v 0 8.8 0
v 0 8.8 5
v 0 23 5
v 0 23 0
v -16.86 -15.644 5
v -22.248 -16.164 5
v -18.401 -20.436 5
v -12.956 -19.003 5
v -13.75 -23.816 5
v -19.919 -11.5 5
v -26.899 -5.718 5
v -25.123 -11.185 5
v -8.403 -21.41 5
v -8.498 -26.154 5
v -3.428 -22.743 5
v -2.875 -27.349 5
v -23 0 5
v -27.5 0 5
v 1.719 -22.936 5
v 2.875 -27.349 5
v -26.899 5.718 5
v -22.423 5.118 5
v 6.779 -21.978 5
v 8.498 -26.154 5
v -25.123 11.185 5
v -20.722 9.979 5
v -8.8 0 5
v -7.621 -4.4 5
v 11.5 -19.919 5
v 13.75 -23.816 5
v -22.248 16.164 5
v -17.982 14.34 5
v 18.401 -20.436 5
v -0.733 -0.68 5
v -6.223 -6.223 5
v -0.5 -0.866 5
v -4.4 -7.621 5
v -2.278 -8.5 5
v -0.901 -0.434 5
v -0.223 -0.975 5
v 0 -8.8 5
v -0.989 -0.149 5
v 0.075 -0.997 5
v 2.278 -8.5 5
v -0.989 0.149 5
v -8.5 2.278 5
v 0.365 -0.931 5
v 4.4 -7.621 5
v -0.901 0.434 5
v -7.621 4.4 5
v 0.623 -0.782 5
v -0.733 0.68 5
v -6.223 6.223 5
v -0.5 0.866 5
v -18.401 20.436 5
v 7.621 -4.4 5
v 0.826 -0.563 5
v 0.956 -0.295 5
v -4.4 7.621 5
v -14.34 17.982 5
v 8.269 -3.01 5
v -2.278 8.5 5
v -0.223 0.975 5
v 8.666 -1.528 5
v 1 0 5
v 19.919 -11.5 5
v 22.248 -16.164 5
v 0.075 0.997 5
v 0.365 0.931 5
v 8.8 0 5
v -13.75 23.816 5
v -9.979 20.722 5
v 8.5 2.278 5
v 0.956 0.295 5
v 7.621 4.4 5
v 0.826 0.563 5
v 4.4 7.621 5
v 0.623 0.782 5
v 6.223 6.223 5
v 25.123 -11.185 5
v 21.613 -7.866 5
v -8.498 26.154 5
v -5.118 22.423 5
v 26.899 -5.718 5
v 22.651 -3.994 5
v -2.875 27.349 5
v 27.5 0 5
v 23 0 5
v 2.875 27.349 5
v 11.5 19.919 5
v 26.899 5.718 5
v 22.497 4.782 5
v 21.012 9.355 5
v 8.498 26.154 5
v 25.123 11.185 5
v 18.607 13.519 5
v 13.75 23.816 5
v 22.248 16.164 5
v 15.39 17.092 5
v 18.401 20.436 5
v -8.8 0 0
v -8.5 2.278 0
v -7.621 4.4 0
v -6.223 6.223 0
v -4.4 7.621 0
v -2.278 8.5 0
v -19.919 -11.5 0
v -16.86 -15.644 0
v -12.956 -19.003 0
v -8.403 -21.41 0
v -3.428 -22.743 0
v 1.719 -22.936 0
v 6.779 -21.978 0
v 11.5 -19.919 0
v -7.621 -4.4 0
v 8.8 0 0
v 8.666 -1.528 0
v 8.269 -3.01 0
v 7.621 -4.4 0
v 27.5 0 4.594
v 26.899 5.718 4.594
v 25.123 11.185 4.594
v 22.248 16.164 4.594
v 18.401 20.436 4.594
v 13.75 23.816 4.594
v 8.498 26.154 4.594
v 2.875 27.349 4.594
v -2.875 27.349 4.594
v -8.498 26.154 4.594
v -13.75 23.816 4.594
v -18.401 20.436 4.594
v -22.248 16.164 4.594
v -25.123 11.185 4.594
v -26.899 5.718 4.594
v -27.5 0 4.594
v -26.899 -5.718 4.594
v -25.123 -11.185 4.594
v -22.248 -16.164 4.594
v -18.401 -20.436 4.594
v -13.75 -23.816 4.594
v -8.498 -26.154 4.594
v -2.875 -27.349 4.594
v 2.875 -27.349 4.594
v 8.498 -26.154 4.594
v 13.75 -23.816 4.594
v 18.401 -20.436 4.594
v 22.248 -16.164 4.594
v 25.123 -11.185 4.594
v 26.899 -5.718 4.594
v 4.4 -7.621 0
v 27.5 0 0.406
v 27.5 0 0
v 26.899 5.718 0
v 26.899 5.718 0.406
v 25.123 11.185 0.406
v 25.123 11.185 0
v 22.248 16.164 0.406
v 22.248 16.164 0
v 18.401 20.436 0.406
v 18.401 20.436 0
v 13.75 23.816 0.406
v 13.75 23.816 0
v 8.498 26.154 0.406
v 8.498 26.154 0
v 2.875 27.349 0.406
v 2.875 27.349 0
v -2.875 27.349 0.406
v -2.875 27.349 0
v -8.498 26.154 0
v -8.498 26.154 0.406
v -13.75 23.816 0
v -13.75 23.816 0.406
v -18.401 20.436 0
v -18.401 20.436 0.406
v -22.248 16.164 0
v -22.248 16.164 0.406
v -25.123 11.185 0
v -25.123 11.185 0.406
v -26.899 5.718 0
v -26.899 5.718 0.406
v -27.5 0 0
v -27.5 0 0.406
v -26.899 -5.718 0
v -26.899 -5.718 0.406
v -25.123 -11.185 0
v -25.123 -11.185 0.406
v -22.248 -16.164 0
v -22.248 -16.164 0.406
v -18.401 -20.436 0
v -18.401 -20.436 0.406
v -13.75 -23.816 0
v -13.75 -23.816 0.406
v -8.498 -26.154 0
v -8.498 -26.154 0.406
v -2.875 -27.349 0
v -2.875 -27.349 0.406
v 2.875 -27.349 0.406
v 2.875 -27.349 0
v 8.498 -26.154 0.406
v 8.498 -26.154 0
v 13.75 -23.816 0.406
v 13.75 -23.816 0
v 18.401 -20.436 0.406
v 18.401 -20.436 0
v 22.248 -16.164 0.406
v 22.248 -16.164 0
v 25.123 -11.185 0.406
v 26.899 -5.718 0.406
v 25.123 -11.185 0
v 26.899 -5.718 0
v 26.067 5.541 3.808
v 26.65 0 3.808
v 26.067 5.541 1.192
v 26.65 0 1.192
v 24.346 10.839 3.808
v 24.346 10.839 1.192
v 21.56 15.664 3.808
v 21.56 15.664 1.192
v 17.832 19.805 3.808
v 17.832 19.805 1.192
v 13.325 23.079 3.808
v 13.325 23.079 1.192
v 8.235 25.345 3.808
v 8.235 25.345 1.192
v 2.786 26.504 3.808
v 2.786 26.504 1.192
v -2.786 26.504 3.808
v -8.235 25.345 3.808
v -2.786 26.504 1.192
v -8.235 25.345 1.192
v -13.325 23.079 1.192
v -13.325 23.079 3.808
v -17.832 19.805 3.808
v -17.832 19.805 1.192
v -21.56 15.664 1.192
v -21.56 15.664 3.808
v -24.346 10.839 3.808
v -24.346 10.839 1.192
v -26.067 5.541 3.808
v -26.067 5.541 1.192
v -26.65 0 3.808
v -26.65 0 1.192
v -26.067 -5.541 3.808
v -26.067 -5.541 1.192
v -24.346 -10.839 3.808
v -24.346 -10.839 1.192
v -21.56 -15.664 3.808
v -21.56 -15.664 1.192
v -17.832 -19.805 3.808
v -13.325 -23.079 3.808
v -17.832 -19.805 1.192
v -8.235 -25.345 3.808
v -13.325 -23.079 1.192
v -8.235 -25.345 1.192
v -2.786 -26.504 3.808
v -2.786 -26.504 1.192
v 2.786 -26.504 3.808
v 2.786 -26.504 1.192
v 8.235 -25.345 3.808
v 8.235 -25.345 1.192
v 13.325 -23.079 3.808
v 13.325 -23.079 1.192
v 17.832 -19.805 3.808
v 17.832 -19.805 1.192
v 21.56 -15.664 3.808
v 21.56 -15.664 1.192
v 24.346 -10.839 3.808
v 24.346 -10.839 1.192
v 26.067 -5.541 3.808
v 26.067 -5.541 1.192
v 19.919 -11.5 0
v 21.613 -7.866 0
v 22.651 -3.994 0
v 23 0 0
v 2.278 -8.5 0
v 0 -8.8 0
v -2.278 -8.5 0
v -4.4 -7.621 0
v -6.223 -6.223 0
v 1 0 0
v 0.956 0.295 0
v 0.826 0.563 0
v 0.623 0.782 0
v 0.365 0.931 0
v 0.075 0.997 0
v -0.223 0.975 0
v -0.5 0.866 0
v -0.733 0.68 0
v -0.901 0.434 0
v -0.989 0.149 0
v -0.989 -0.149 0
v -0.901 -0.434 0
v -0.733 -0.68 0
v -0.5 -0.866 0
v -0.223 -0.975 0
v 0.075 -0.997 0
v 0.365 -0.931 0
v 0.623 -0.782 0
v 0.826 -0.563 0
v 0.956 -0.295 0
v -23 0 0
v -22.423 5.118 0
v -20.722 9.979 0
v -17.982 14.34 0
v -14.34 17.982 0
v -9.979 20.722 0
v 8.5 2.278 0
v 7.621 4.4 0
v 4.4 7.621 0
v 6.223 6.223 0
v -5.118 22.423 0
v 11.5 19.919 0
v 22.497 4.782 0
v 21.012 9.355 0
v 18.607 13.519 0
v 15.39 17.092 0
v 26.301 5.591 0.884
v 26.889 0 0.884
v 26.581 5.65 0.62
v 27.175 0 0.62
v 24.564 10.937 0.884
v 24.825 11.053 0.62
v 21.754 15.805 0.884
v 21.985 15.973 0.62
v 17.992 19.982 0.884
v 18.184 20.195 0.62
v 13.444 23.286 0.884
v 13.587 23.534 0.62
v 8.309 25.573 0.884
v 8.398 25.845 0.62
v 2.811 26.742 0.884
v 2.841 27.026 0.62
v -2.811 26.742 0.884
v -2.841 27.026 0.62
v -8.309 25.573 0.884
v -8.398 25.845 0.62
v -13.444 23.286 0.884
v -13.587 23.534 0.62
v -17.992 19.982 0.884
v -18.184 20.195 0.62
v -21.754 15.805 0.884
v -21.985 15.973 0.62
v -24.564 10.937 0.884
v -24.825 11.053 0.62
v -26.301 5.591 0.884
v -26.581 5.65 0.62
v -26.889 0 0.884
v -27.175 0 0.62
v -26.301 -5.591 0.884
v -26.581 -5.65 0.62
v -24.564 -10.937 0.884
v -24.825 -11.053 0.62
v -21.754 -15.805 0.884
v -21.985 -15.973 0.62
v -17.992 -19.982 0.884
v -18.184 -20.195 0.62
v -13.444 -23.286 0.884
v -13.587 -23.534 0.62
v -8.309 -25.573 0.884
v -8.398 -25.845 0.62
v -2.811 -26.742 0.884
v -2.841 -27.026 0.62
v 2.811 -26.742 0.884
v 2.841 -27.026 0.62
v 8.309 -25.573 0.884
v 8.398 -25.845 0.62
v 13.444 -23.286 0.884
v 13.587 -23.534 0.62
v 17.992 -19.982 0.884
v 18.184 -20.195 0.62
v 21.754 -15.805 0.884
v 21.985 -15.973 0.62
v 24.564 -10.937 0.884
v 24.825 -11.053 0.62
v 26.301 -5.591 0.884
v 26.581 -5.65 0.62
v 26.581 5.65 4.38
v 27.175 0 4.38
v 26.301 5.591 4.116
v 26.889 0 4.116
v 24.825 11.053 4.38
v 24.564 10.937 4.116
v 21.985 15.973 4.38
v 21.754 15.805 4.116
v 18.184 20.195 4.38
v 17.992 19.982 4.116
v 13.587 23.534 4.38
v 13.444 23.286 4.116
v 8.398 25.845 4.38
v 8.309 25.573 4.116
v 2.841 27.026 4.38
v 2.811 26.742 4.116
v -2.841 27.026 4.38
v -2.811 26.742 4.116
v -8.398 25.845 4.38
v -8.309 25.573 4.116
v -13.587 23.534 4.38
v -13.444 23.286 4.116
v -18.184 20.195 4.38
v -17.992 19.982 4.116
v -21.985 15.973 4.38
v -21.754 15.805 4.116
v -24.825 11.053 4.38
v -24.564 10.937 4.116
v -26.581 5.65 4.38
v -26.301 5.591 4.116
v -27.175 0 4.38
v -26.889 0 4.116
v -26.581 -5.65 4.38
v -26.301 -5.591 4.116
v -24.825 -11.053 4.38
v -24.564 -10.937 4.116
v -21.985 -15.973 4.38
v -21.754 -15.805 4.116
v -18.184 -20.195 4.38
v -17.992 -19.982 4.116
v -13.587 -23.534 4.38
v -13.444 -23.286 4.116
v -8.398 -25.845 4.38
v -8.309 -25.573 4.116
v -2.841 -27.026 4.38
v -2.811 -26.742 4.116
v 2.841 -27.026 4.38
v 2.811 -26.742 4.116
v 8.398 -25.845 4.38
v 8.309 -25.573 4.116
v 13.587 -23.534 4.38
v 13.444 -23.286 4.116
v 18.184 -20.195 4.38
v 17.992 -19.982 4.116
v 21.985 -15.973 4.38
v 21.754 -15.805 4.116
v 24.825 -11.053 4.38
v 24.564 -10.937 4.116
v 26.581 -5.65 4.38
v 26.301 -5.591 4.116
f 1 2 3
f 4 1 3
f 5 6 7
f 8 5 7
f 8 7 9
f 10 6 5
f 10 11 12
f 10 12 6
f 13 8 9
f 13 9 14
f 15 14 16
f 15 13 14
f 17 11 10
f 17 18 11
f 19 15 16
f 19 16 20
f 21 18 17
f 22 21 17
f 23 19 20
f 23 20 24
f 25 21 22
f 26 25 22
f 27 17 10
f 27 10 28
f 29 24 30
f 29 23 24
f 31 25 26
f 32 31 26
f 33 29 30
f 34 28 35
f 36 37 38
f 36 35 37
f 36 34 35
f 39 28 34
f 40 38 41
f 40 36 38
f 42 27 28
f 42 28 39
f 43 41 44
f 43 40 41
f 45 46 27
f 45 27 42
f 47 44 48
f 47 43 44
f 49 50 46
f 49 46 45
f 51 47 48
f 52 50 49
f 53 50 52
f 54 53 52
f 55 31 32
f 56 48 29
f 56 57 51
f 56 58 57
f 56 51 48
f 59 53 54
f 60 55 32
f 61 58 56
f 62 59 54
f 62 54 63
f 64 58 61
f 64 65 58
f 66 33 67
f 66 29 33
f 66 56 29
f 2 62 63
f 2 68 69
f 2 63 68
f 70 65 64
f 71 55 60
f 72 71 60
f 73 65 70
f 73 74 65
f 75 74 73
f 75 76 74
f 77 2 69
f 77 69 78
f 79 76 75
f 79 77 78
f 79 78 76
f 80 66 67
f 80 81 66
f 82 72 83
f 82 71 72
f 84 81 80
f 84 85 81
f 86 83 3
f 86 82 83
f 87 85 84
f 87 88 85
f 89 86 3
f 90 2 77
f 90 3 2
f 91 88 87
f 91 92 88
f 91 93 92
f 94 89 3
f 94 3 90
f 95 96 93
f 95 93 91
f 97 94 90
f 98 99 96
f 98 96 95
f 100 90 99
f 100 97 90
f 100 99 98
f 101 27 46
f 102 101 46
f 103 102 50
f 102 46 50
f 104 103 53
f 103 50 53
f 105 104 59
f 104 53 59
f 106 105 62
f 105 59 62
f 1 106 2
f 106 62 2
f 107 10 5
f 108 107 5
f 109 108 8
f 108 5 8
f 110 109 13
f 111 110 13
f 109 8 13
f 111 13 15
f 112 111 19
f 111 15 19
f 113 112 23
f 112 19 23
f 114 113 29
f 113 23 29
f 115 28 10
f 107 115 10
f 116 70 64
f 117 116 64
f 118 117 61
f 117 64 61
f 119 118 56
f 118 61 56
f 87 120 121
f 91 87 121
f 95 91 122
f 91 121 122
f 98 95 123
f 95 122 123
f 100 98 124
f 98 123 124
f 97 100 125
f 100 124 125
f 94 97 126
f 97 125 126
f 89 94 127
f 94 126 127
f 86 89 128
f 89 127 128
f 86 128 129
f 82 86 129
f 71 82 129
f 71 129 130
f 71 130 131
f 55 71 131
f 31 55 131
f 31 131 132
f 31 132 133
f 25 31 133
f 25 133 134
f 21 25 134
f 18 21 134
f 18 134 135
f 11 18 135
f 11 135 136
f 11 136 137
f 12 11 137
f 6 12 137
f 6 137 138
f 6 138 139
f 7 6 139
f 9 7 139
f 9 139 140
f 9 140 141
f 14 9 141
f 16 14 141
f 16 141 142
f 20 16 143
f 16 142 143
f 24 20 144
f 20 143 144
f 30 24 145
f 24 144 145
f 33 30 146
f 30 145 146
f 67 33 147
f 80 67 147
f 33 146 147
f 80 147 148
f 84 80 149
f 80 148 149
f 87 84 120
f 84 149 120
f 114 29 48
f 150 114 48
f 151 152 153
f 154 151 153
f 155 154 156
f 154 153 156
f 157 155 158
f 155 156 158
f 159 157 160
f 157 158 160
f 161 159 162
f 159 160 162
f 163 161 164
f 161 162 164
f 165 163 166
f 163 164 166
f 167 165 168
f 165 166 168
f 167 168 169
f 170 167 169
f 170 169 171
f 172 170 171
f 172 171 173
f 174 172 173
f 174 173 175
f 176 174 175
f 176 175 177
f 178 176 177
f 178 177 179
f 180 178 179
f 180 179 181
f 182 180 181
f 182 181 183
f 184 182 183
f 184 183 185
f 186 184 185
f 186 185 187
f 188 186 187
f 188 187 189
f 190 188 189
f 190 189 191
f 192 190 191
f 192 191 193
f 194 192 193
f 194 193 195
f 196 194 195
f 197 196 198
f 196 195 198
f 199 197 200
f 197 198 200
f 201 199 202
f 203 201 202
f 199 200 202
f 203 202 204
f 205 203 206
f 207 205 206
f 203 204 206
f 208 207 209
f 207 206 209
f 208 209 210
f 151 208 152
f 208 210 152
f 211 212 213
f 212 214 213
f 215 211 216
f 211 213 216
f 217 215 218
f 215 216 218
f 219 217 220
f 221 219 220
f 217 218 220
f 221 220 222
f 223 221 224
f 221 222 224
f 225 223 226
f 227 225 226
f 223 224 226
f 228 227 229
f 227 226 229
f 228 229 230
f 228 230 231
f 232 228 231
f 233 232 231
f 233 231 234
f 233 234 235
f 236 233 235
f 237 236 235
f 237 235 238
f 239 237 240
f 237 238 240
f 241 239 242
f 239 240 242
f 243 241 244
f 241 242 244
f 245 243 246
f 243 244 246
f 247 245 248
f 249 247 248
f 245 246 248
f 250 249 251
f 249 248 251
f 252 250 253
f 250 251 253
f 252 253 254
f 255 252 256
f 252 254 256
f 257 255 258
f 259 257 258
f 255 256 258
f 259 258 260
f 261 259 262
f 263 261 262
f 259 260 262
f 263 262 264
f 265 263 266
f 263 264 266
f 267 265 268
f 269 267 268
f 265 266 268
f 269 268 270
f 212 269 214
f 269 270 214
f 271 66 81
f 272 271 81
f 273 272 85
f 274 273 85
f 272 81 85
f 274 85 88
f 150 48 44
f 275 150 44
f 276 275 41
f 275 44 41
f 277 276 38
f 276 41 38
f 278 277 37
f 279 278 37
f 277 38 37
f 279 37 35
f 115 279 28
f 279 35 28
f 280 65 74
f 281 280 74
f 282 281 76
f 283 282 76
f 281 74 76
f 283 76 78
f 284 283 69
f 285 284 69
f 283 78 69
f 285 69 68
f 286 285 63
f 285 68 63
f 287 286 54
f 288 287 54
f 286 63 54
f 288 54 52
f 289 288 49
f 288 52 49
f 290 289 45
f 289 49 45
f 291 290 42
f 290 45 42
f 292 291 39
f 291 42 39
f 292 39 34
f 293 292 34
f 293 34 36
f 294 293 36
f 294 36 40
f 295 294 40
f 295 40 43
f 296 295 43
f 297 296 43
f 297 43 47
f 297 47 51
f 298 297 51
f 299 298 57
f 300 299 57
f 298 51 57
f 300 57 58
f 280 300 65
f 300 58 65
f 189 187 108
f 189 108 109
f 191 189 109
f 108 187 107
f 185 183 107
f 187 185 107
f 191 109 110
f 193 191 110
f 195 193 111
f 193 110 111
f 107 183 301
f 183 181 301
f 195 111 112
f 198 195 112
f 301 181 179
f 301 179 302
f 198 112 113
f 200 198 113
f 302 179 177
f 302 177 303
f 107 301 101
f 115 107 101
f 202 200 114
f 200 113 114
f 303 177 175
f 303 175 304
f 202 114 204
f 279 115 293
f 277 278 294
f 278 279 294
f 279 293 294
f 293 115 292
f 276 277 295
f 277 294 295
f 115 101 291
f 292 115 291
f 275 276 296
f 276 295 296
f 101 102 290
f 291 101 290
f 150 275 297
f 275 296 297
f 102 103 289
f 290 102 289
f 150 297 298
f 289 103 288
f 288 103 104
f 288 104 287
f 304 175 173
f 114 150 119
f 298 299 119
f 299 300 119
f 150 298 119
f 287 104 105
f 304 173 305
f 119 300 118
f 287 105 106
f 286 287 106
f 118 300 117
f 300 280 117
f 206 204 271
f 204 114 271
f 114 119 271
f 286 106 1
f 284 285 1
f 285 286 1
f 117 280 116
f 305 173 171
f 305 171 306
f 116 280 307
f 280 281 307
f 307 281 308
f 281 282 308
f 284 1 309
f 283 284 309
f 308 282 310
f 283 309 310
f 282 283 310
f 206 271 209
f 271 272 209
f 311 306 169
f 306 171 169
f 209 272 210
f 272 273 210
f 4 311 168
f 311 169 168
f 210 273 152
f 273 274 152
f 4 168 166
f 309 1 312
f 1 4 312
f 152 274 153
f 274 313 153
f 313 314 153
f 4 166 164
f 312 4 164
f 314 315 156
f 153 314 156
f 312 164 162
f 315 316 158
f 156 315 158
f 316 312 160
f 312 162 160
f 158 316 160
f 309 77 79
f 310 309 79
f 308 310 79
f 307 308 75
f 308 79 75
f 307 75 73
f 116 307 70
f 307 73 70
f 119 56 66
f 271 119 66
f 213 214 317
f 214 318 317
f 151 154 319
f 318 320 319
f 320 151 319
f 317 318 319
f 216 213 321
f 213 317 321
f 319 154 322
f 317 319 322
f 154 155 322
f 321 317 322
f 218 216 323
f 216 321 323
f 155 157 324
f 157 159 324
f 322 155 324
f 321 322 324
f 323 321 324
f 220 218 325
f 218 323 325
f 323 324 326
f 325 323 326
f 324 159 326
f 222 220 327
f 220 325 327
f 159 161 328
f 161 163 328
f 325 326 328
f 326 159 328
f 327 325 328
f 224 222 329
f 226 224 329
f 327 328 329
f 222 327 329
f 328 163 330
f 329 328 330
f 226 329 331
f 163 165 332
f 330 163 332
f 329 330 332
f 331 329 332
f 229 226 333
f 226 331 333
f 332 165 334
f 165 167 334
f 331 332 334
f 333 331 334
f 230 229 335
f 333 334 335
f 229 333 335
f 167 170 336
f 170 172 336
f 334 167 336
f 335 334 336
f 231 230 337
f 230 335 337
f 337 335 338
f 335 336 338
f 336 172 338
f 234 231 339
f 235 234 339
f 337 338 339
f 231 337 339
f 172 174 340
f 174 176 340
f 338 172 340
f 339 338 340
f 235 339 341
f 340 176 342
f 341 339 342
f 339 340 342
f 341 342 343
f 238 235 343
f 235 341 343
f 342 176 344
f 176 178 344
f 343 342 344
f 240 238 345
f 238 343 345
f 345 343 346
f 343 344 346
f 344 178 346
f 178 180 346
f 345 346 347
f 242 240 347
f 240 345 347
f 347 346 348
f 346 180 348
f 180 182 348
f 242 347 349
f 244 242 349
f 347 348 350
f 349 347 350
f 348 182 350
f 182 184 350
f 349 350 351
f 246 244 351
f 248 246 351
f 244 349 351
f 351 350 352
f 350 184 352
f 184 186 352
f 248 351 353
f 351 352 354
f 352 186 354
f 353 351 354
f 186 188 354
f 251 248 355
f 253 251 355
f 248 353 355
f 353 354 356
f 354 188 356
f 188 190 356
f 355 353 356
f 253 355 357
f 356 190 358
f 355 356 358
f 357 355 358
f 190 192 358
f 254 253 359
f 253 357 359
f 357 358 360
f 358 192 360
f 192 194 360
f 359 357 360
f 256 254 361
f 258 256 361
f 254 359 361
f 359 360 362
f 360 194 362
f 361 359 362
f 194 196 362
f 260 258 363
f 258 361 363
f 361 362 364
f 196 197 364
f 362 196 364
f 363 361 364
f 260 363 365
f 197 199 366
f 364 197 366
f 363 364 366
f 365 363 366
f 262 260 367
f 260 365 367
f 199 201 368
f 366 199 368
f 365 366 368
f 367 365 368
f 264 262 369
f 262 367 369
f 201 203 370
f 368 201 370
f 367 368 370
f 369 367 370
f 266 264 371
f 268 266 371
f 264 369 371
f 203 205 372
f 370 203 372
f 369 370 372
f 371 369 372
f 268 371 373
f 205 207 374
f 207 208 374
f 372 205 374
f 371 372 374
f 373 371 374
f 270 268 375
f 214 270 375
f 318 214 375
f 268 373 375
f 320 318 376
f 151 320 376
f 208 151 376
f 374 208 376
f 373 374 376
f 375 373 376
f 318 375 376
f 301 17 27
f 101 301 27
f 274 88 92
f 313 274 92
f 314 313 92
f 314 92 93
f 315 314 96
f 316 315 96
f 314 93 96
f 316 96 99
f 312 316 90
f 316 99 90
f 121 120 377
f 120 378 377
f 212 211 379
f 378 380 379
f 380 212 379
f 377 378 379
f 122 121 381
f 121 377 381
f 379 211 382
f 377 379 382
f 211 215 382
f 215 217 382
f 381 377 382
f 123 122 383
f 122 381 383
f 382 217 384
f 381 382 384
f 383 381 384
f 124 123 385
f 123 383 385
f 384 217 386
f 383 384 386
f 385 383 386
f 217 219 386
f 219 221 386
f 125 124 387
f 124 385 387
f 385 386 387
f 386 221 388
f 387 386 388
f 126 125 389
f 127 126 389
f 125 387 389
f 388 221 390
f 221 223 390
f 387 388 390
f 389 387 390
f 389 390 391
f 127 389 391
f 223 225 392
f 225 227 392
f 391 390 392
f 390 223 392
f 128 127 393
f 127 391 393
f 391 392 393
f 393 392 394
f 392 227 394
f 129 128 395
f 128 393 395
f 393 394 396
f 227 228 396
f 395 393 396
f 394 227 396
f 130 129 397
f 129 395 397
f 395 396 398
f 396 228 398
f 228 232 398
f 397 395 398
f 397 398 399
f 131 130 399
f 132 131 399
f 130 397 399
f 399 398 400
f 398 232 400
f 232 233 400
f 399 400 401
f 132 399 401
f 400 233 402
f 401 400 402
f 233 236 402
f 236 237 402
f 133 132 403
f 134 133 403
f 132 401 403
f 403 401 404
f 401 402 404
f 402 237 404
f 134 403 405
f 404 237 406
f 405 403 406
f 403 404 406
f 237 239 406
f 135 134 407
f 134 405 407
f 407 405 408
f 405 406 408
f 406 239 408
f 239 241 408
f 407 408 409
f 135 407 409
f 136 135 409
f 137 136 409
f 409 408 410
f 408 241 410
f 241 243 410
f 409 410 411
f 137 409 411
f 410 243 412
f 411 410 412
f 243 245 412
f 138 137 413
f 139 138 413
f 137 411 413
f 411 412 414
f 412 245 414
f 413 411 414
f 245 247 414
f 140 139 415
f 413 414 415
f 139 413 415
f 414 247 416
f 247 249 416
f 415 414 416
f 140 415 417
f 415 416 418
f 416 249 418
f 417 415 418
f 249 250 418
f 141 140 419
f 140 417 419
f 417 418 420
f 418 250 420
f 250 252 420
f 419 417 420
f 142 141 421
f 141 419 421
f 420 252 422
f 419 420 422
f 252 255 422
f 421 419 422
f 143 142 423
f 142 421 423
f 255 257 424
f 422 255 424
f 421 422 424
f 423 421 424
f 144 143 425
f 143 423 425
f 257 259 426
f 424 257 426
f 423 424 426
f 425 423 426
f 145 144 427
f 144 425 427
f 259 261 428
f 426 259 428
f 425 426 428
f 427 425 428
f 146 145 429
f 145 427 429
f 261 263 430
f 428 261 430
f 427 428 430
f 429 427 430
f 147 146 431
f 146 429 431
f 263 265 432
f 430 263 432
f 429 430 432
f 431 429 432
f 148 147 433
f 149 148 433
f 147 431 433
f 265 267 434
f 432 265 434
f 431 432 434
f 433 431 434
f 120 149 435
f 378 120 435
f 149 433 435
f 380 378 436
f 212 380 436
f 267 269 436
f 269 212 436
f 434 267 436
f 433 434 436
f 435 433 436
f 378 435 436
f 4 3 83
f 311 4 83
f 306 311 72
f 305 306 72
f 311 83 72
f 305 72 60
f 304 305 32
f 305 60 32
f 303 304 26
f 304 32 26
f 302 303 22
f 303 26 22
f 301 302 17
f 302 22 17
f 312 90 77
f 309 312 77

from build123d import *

# Parameters (mm, degrees)
ESBO_O1_R                = 27.5
RESSALTO_EXTRUS_O1_DEPTH = 5
ESBO_O9_R                = 1
CORTE_EXTRUS_O1_DEPTH    = 5
CORTE_EXTRUS_O2_DEPTH    = 5


with BuildPart() as part:
    # Esboço1 → Ressalto-extrusão1 (new body)
    with BuildSketch(Plane.XY):
        Circle(ESBO_O1_R)
    extrude(amount=RESSALTO_EXTRUS_O1_DEPTH)

    # Esboço7 → Corte-Revolução4 (revolve, cut)
    with BuildSketch(Plane(origin=(0, 0, 0), x_dir=(0, 0, -1), z_dir=(1, 0, 0))):
        with BuildLine():
            ThreePointArc((-0.112348688, 28.646890778), (-3.63505257, 30.747494132), (-3.808478377, 26.649701973))
            Line((-3.808478377, 26.649701973), (-1.191521623, 26.649701973))
            ThreePointArc((-1.191521623, 26.649701973), (-0.399396646, 27.511838208), (-0.112348688, 28.646890778))
        make_face()
    revolve(axis=Axis((0, 0, 5), (0, 0, -1)), mode=Mode.SUBTRACT)

    # Esboço9 → Corte-extrusão1 (cut)
    with BuildSketch(Plane.XY.offset(5)):
        Circle(ESBO_O9_R)
    extrude(amount=-CORTE_EXTRUS_O1_DEPTH, mode=Mode.SUBTRACT)

    # Esboço10 → Corte-extrusão2 (cut)
    with BuildSketch(Plane.XY.offset(5)):
        with BuildLine():
            ThreePointArc((-8.8, 0), (-6.222539674, 6.222539674), (0, 8.8))
            Line((0, 8.8), (0, 23))
            ThreePointArc((0, 23), (-16.263455967, 16.263455967), (-23, 0))
            Line((-23, 0), (-8.8, 0))
        make_face()
        with BuildLine():
            Line((11.5, 19.918584287), (4.4, 7.621023553))
            ThreePointArc((4.4, 7.621023553), (8.500147271, 2.277607597), (7.621023553, -4.4))
            Line((7.621023553, -4.4), (19.918584287, -11.5))
            ThreePointArc((19.918584287, -11.5), (22.216294005, 5.952838037), (11.5, 19.918584287))
        make_face()
        with BuildLine():
            ThreePointArc((4.4, -7.621023553), (-2.277607597, -8.500147271), (-7.621023553, -4.4))
            Line((-7.621023553, -4.4), (-19.918584287, -11.5))
            ThreePointArc((-19.918584287, -11.5), (-5.952838037, -22.216294005), (11.5, -19.918584287))
            Line((11.5, -19.918584287), (4.4, -7.621023553))
        make_face()
    extrude(amount=-CORTE_EXTRUS_O2_DEPTH, mode=Mode.SUBTRACT)


solid = part.part
